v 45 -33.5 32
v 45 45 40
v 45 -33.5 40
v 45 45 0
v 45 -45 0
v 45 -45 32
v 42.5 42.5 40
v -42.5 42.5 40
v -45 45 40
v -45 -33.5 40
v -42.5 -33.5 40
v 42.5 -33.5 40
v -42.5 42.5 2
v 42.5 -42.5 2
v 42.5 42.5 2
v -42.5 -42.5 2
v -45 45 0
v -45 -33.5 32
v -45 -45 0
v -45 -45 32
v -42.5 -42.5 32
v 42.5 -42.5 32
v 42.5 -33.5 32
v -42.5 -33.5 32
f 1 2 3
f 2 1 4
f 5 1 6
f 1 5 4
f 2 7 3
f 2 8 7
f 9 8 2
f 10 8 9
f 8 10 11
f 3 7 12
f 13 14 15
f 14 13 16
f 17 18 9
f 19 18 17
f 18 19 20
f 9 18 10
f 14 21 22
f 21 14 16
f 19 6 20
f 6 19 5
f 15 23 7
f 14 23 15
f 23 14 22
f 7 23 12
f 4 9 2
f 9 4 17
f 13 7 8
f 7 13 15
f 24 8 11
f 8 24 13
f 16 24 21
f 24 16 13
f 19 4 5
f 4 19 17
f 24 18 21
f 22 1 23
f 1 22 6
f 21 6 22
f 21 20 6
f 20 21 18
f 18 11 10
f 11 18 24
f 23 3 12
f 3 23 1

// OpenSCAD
// Magnetic stirrer housing - upside-down open box over 80 mm PC fan
// Print orientation: top plate on bed (z = 0), walls rise to open top (z = 40)

$fn = 64;

// ---- Dimensions (mm) ----
plate_t      = 2;     // top plate thickness
wall_t       = 2.5;   // wall thickness
box_h        = 40;    // total height, open from z = 32
outer_x      = 90;    // outer size in X
outer_y      = 90;    // outer size in Y
screw_d      = 4.5;   // M4 screw hole diameter
screw_pitch  = 71.5;  // square hole pattern side
notch_w      = 12;    // cable notch width
notch_depth  = 8;     // notch depth from open edge (z = 32 to 40)
eps          = 0.5;   // cutter overshoot

// ---- Model ----
difference() {
    union() {
        // top plate
        translate([-outer_x/2, -outer_y/2, 0])
            cube([outer_x, outer_y, plate_t]);
        // four walls, open top
        for (a = [0, 90, 180, 270])
            rotate([0, 0, a])
                translate([-outer_x/2, -outer_y/2, plate_t])
                    cube([outer_x, wall_t, box_h - plate_t]);
    }
    // screw holes through top plate
    for (i = [0 : 3])
        for (j = [0 : 3])
            if (abs(i - j) > 0)
                translate([(i - (screw_pitch - 1)/2) * screw_pitch,
                           (j - (screw_pitch - 1)/2) * screw_pitch,
                           -eps])
                    cylinder(d = screw_d, h = plate_t + 2*eps);
    // cable notch in one wall, centred along X
    translate([-outer_x/2, -outer_y/2 - eps, box_h - notch_depth])
        cube([outer_x + 2*eps, notch_w, notch_depth]);
}
